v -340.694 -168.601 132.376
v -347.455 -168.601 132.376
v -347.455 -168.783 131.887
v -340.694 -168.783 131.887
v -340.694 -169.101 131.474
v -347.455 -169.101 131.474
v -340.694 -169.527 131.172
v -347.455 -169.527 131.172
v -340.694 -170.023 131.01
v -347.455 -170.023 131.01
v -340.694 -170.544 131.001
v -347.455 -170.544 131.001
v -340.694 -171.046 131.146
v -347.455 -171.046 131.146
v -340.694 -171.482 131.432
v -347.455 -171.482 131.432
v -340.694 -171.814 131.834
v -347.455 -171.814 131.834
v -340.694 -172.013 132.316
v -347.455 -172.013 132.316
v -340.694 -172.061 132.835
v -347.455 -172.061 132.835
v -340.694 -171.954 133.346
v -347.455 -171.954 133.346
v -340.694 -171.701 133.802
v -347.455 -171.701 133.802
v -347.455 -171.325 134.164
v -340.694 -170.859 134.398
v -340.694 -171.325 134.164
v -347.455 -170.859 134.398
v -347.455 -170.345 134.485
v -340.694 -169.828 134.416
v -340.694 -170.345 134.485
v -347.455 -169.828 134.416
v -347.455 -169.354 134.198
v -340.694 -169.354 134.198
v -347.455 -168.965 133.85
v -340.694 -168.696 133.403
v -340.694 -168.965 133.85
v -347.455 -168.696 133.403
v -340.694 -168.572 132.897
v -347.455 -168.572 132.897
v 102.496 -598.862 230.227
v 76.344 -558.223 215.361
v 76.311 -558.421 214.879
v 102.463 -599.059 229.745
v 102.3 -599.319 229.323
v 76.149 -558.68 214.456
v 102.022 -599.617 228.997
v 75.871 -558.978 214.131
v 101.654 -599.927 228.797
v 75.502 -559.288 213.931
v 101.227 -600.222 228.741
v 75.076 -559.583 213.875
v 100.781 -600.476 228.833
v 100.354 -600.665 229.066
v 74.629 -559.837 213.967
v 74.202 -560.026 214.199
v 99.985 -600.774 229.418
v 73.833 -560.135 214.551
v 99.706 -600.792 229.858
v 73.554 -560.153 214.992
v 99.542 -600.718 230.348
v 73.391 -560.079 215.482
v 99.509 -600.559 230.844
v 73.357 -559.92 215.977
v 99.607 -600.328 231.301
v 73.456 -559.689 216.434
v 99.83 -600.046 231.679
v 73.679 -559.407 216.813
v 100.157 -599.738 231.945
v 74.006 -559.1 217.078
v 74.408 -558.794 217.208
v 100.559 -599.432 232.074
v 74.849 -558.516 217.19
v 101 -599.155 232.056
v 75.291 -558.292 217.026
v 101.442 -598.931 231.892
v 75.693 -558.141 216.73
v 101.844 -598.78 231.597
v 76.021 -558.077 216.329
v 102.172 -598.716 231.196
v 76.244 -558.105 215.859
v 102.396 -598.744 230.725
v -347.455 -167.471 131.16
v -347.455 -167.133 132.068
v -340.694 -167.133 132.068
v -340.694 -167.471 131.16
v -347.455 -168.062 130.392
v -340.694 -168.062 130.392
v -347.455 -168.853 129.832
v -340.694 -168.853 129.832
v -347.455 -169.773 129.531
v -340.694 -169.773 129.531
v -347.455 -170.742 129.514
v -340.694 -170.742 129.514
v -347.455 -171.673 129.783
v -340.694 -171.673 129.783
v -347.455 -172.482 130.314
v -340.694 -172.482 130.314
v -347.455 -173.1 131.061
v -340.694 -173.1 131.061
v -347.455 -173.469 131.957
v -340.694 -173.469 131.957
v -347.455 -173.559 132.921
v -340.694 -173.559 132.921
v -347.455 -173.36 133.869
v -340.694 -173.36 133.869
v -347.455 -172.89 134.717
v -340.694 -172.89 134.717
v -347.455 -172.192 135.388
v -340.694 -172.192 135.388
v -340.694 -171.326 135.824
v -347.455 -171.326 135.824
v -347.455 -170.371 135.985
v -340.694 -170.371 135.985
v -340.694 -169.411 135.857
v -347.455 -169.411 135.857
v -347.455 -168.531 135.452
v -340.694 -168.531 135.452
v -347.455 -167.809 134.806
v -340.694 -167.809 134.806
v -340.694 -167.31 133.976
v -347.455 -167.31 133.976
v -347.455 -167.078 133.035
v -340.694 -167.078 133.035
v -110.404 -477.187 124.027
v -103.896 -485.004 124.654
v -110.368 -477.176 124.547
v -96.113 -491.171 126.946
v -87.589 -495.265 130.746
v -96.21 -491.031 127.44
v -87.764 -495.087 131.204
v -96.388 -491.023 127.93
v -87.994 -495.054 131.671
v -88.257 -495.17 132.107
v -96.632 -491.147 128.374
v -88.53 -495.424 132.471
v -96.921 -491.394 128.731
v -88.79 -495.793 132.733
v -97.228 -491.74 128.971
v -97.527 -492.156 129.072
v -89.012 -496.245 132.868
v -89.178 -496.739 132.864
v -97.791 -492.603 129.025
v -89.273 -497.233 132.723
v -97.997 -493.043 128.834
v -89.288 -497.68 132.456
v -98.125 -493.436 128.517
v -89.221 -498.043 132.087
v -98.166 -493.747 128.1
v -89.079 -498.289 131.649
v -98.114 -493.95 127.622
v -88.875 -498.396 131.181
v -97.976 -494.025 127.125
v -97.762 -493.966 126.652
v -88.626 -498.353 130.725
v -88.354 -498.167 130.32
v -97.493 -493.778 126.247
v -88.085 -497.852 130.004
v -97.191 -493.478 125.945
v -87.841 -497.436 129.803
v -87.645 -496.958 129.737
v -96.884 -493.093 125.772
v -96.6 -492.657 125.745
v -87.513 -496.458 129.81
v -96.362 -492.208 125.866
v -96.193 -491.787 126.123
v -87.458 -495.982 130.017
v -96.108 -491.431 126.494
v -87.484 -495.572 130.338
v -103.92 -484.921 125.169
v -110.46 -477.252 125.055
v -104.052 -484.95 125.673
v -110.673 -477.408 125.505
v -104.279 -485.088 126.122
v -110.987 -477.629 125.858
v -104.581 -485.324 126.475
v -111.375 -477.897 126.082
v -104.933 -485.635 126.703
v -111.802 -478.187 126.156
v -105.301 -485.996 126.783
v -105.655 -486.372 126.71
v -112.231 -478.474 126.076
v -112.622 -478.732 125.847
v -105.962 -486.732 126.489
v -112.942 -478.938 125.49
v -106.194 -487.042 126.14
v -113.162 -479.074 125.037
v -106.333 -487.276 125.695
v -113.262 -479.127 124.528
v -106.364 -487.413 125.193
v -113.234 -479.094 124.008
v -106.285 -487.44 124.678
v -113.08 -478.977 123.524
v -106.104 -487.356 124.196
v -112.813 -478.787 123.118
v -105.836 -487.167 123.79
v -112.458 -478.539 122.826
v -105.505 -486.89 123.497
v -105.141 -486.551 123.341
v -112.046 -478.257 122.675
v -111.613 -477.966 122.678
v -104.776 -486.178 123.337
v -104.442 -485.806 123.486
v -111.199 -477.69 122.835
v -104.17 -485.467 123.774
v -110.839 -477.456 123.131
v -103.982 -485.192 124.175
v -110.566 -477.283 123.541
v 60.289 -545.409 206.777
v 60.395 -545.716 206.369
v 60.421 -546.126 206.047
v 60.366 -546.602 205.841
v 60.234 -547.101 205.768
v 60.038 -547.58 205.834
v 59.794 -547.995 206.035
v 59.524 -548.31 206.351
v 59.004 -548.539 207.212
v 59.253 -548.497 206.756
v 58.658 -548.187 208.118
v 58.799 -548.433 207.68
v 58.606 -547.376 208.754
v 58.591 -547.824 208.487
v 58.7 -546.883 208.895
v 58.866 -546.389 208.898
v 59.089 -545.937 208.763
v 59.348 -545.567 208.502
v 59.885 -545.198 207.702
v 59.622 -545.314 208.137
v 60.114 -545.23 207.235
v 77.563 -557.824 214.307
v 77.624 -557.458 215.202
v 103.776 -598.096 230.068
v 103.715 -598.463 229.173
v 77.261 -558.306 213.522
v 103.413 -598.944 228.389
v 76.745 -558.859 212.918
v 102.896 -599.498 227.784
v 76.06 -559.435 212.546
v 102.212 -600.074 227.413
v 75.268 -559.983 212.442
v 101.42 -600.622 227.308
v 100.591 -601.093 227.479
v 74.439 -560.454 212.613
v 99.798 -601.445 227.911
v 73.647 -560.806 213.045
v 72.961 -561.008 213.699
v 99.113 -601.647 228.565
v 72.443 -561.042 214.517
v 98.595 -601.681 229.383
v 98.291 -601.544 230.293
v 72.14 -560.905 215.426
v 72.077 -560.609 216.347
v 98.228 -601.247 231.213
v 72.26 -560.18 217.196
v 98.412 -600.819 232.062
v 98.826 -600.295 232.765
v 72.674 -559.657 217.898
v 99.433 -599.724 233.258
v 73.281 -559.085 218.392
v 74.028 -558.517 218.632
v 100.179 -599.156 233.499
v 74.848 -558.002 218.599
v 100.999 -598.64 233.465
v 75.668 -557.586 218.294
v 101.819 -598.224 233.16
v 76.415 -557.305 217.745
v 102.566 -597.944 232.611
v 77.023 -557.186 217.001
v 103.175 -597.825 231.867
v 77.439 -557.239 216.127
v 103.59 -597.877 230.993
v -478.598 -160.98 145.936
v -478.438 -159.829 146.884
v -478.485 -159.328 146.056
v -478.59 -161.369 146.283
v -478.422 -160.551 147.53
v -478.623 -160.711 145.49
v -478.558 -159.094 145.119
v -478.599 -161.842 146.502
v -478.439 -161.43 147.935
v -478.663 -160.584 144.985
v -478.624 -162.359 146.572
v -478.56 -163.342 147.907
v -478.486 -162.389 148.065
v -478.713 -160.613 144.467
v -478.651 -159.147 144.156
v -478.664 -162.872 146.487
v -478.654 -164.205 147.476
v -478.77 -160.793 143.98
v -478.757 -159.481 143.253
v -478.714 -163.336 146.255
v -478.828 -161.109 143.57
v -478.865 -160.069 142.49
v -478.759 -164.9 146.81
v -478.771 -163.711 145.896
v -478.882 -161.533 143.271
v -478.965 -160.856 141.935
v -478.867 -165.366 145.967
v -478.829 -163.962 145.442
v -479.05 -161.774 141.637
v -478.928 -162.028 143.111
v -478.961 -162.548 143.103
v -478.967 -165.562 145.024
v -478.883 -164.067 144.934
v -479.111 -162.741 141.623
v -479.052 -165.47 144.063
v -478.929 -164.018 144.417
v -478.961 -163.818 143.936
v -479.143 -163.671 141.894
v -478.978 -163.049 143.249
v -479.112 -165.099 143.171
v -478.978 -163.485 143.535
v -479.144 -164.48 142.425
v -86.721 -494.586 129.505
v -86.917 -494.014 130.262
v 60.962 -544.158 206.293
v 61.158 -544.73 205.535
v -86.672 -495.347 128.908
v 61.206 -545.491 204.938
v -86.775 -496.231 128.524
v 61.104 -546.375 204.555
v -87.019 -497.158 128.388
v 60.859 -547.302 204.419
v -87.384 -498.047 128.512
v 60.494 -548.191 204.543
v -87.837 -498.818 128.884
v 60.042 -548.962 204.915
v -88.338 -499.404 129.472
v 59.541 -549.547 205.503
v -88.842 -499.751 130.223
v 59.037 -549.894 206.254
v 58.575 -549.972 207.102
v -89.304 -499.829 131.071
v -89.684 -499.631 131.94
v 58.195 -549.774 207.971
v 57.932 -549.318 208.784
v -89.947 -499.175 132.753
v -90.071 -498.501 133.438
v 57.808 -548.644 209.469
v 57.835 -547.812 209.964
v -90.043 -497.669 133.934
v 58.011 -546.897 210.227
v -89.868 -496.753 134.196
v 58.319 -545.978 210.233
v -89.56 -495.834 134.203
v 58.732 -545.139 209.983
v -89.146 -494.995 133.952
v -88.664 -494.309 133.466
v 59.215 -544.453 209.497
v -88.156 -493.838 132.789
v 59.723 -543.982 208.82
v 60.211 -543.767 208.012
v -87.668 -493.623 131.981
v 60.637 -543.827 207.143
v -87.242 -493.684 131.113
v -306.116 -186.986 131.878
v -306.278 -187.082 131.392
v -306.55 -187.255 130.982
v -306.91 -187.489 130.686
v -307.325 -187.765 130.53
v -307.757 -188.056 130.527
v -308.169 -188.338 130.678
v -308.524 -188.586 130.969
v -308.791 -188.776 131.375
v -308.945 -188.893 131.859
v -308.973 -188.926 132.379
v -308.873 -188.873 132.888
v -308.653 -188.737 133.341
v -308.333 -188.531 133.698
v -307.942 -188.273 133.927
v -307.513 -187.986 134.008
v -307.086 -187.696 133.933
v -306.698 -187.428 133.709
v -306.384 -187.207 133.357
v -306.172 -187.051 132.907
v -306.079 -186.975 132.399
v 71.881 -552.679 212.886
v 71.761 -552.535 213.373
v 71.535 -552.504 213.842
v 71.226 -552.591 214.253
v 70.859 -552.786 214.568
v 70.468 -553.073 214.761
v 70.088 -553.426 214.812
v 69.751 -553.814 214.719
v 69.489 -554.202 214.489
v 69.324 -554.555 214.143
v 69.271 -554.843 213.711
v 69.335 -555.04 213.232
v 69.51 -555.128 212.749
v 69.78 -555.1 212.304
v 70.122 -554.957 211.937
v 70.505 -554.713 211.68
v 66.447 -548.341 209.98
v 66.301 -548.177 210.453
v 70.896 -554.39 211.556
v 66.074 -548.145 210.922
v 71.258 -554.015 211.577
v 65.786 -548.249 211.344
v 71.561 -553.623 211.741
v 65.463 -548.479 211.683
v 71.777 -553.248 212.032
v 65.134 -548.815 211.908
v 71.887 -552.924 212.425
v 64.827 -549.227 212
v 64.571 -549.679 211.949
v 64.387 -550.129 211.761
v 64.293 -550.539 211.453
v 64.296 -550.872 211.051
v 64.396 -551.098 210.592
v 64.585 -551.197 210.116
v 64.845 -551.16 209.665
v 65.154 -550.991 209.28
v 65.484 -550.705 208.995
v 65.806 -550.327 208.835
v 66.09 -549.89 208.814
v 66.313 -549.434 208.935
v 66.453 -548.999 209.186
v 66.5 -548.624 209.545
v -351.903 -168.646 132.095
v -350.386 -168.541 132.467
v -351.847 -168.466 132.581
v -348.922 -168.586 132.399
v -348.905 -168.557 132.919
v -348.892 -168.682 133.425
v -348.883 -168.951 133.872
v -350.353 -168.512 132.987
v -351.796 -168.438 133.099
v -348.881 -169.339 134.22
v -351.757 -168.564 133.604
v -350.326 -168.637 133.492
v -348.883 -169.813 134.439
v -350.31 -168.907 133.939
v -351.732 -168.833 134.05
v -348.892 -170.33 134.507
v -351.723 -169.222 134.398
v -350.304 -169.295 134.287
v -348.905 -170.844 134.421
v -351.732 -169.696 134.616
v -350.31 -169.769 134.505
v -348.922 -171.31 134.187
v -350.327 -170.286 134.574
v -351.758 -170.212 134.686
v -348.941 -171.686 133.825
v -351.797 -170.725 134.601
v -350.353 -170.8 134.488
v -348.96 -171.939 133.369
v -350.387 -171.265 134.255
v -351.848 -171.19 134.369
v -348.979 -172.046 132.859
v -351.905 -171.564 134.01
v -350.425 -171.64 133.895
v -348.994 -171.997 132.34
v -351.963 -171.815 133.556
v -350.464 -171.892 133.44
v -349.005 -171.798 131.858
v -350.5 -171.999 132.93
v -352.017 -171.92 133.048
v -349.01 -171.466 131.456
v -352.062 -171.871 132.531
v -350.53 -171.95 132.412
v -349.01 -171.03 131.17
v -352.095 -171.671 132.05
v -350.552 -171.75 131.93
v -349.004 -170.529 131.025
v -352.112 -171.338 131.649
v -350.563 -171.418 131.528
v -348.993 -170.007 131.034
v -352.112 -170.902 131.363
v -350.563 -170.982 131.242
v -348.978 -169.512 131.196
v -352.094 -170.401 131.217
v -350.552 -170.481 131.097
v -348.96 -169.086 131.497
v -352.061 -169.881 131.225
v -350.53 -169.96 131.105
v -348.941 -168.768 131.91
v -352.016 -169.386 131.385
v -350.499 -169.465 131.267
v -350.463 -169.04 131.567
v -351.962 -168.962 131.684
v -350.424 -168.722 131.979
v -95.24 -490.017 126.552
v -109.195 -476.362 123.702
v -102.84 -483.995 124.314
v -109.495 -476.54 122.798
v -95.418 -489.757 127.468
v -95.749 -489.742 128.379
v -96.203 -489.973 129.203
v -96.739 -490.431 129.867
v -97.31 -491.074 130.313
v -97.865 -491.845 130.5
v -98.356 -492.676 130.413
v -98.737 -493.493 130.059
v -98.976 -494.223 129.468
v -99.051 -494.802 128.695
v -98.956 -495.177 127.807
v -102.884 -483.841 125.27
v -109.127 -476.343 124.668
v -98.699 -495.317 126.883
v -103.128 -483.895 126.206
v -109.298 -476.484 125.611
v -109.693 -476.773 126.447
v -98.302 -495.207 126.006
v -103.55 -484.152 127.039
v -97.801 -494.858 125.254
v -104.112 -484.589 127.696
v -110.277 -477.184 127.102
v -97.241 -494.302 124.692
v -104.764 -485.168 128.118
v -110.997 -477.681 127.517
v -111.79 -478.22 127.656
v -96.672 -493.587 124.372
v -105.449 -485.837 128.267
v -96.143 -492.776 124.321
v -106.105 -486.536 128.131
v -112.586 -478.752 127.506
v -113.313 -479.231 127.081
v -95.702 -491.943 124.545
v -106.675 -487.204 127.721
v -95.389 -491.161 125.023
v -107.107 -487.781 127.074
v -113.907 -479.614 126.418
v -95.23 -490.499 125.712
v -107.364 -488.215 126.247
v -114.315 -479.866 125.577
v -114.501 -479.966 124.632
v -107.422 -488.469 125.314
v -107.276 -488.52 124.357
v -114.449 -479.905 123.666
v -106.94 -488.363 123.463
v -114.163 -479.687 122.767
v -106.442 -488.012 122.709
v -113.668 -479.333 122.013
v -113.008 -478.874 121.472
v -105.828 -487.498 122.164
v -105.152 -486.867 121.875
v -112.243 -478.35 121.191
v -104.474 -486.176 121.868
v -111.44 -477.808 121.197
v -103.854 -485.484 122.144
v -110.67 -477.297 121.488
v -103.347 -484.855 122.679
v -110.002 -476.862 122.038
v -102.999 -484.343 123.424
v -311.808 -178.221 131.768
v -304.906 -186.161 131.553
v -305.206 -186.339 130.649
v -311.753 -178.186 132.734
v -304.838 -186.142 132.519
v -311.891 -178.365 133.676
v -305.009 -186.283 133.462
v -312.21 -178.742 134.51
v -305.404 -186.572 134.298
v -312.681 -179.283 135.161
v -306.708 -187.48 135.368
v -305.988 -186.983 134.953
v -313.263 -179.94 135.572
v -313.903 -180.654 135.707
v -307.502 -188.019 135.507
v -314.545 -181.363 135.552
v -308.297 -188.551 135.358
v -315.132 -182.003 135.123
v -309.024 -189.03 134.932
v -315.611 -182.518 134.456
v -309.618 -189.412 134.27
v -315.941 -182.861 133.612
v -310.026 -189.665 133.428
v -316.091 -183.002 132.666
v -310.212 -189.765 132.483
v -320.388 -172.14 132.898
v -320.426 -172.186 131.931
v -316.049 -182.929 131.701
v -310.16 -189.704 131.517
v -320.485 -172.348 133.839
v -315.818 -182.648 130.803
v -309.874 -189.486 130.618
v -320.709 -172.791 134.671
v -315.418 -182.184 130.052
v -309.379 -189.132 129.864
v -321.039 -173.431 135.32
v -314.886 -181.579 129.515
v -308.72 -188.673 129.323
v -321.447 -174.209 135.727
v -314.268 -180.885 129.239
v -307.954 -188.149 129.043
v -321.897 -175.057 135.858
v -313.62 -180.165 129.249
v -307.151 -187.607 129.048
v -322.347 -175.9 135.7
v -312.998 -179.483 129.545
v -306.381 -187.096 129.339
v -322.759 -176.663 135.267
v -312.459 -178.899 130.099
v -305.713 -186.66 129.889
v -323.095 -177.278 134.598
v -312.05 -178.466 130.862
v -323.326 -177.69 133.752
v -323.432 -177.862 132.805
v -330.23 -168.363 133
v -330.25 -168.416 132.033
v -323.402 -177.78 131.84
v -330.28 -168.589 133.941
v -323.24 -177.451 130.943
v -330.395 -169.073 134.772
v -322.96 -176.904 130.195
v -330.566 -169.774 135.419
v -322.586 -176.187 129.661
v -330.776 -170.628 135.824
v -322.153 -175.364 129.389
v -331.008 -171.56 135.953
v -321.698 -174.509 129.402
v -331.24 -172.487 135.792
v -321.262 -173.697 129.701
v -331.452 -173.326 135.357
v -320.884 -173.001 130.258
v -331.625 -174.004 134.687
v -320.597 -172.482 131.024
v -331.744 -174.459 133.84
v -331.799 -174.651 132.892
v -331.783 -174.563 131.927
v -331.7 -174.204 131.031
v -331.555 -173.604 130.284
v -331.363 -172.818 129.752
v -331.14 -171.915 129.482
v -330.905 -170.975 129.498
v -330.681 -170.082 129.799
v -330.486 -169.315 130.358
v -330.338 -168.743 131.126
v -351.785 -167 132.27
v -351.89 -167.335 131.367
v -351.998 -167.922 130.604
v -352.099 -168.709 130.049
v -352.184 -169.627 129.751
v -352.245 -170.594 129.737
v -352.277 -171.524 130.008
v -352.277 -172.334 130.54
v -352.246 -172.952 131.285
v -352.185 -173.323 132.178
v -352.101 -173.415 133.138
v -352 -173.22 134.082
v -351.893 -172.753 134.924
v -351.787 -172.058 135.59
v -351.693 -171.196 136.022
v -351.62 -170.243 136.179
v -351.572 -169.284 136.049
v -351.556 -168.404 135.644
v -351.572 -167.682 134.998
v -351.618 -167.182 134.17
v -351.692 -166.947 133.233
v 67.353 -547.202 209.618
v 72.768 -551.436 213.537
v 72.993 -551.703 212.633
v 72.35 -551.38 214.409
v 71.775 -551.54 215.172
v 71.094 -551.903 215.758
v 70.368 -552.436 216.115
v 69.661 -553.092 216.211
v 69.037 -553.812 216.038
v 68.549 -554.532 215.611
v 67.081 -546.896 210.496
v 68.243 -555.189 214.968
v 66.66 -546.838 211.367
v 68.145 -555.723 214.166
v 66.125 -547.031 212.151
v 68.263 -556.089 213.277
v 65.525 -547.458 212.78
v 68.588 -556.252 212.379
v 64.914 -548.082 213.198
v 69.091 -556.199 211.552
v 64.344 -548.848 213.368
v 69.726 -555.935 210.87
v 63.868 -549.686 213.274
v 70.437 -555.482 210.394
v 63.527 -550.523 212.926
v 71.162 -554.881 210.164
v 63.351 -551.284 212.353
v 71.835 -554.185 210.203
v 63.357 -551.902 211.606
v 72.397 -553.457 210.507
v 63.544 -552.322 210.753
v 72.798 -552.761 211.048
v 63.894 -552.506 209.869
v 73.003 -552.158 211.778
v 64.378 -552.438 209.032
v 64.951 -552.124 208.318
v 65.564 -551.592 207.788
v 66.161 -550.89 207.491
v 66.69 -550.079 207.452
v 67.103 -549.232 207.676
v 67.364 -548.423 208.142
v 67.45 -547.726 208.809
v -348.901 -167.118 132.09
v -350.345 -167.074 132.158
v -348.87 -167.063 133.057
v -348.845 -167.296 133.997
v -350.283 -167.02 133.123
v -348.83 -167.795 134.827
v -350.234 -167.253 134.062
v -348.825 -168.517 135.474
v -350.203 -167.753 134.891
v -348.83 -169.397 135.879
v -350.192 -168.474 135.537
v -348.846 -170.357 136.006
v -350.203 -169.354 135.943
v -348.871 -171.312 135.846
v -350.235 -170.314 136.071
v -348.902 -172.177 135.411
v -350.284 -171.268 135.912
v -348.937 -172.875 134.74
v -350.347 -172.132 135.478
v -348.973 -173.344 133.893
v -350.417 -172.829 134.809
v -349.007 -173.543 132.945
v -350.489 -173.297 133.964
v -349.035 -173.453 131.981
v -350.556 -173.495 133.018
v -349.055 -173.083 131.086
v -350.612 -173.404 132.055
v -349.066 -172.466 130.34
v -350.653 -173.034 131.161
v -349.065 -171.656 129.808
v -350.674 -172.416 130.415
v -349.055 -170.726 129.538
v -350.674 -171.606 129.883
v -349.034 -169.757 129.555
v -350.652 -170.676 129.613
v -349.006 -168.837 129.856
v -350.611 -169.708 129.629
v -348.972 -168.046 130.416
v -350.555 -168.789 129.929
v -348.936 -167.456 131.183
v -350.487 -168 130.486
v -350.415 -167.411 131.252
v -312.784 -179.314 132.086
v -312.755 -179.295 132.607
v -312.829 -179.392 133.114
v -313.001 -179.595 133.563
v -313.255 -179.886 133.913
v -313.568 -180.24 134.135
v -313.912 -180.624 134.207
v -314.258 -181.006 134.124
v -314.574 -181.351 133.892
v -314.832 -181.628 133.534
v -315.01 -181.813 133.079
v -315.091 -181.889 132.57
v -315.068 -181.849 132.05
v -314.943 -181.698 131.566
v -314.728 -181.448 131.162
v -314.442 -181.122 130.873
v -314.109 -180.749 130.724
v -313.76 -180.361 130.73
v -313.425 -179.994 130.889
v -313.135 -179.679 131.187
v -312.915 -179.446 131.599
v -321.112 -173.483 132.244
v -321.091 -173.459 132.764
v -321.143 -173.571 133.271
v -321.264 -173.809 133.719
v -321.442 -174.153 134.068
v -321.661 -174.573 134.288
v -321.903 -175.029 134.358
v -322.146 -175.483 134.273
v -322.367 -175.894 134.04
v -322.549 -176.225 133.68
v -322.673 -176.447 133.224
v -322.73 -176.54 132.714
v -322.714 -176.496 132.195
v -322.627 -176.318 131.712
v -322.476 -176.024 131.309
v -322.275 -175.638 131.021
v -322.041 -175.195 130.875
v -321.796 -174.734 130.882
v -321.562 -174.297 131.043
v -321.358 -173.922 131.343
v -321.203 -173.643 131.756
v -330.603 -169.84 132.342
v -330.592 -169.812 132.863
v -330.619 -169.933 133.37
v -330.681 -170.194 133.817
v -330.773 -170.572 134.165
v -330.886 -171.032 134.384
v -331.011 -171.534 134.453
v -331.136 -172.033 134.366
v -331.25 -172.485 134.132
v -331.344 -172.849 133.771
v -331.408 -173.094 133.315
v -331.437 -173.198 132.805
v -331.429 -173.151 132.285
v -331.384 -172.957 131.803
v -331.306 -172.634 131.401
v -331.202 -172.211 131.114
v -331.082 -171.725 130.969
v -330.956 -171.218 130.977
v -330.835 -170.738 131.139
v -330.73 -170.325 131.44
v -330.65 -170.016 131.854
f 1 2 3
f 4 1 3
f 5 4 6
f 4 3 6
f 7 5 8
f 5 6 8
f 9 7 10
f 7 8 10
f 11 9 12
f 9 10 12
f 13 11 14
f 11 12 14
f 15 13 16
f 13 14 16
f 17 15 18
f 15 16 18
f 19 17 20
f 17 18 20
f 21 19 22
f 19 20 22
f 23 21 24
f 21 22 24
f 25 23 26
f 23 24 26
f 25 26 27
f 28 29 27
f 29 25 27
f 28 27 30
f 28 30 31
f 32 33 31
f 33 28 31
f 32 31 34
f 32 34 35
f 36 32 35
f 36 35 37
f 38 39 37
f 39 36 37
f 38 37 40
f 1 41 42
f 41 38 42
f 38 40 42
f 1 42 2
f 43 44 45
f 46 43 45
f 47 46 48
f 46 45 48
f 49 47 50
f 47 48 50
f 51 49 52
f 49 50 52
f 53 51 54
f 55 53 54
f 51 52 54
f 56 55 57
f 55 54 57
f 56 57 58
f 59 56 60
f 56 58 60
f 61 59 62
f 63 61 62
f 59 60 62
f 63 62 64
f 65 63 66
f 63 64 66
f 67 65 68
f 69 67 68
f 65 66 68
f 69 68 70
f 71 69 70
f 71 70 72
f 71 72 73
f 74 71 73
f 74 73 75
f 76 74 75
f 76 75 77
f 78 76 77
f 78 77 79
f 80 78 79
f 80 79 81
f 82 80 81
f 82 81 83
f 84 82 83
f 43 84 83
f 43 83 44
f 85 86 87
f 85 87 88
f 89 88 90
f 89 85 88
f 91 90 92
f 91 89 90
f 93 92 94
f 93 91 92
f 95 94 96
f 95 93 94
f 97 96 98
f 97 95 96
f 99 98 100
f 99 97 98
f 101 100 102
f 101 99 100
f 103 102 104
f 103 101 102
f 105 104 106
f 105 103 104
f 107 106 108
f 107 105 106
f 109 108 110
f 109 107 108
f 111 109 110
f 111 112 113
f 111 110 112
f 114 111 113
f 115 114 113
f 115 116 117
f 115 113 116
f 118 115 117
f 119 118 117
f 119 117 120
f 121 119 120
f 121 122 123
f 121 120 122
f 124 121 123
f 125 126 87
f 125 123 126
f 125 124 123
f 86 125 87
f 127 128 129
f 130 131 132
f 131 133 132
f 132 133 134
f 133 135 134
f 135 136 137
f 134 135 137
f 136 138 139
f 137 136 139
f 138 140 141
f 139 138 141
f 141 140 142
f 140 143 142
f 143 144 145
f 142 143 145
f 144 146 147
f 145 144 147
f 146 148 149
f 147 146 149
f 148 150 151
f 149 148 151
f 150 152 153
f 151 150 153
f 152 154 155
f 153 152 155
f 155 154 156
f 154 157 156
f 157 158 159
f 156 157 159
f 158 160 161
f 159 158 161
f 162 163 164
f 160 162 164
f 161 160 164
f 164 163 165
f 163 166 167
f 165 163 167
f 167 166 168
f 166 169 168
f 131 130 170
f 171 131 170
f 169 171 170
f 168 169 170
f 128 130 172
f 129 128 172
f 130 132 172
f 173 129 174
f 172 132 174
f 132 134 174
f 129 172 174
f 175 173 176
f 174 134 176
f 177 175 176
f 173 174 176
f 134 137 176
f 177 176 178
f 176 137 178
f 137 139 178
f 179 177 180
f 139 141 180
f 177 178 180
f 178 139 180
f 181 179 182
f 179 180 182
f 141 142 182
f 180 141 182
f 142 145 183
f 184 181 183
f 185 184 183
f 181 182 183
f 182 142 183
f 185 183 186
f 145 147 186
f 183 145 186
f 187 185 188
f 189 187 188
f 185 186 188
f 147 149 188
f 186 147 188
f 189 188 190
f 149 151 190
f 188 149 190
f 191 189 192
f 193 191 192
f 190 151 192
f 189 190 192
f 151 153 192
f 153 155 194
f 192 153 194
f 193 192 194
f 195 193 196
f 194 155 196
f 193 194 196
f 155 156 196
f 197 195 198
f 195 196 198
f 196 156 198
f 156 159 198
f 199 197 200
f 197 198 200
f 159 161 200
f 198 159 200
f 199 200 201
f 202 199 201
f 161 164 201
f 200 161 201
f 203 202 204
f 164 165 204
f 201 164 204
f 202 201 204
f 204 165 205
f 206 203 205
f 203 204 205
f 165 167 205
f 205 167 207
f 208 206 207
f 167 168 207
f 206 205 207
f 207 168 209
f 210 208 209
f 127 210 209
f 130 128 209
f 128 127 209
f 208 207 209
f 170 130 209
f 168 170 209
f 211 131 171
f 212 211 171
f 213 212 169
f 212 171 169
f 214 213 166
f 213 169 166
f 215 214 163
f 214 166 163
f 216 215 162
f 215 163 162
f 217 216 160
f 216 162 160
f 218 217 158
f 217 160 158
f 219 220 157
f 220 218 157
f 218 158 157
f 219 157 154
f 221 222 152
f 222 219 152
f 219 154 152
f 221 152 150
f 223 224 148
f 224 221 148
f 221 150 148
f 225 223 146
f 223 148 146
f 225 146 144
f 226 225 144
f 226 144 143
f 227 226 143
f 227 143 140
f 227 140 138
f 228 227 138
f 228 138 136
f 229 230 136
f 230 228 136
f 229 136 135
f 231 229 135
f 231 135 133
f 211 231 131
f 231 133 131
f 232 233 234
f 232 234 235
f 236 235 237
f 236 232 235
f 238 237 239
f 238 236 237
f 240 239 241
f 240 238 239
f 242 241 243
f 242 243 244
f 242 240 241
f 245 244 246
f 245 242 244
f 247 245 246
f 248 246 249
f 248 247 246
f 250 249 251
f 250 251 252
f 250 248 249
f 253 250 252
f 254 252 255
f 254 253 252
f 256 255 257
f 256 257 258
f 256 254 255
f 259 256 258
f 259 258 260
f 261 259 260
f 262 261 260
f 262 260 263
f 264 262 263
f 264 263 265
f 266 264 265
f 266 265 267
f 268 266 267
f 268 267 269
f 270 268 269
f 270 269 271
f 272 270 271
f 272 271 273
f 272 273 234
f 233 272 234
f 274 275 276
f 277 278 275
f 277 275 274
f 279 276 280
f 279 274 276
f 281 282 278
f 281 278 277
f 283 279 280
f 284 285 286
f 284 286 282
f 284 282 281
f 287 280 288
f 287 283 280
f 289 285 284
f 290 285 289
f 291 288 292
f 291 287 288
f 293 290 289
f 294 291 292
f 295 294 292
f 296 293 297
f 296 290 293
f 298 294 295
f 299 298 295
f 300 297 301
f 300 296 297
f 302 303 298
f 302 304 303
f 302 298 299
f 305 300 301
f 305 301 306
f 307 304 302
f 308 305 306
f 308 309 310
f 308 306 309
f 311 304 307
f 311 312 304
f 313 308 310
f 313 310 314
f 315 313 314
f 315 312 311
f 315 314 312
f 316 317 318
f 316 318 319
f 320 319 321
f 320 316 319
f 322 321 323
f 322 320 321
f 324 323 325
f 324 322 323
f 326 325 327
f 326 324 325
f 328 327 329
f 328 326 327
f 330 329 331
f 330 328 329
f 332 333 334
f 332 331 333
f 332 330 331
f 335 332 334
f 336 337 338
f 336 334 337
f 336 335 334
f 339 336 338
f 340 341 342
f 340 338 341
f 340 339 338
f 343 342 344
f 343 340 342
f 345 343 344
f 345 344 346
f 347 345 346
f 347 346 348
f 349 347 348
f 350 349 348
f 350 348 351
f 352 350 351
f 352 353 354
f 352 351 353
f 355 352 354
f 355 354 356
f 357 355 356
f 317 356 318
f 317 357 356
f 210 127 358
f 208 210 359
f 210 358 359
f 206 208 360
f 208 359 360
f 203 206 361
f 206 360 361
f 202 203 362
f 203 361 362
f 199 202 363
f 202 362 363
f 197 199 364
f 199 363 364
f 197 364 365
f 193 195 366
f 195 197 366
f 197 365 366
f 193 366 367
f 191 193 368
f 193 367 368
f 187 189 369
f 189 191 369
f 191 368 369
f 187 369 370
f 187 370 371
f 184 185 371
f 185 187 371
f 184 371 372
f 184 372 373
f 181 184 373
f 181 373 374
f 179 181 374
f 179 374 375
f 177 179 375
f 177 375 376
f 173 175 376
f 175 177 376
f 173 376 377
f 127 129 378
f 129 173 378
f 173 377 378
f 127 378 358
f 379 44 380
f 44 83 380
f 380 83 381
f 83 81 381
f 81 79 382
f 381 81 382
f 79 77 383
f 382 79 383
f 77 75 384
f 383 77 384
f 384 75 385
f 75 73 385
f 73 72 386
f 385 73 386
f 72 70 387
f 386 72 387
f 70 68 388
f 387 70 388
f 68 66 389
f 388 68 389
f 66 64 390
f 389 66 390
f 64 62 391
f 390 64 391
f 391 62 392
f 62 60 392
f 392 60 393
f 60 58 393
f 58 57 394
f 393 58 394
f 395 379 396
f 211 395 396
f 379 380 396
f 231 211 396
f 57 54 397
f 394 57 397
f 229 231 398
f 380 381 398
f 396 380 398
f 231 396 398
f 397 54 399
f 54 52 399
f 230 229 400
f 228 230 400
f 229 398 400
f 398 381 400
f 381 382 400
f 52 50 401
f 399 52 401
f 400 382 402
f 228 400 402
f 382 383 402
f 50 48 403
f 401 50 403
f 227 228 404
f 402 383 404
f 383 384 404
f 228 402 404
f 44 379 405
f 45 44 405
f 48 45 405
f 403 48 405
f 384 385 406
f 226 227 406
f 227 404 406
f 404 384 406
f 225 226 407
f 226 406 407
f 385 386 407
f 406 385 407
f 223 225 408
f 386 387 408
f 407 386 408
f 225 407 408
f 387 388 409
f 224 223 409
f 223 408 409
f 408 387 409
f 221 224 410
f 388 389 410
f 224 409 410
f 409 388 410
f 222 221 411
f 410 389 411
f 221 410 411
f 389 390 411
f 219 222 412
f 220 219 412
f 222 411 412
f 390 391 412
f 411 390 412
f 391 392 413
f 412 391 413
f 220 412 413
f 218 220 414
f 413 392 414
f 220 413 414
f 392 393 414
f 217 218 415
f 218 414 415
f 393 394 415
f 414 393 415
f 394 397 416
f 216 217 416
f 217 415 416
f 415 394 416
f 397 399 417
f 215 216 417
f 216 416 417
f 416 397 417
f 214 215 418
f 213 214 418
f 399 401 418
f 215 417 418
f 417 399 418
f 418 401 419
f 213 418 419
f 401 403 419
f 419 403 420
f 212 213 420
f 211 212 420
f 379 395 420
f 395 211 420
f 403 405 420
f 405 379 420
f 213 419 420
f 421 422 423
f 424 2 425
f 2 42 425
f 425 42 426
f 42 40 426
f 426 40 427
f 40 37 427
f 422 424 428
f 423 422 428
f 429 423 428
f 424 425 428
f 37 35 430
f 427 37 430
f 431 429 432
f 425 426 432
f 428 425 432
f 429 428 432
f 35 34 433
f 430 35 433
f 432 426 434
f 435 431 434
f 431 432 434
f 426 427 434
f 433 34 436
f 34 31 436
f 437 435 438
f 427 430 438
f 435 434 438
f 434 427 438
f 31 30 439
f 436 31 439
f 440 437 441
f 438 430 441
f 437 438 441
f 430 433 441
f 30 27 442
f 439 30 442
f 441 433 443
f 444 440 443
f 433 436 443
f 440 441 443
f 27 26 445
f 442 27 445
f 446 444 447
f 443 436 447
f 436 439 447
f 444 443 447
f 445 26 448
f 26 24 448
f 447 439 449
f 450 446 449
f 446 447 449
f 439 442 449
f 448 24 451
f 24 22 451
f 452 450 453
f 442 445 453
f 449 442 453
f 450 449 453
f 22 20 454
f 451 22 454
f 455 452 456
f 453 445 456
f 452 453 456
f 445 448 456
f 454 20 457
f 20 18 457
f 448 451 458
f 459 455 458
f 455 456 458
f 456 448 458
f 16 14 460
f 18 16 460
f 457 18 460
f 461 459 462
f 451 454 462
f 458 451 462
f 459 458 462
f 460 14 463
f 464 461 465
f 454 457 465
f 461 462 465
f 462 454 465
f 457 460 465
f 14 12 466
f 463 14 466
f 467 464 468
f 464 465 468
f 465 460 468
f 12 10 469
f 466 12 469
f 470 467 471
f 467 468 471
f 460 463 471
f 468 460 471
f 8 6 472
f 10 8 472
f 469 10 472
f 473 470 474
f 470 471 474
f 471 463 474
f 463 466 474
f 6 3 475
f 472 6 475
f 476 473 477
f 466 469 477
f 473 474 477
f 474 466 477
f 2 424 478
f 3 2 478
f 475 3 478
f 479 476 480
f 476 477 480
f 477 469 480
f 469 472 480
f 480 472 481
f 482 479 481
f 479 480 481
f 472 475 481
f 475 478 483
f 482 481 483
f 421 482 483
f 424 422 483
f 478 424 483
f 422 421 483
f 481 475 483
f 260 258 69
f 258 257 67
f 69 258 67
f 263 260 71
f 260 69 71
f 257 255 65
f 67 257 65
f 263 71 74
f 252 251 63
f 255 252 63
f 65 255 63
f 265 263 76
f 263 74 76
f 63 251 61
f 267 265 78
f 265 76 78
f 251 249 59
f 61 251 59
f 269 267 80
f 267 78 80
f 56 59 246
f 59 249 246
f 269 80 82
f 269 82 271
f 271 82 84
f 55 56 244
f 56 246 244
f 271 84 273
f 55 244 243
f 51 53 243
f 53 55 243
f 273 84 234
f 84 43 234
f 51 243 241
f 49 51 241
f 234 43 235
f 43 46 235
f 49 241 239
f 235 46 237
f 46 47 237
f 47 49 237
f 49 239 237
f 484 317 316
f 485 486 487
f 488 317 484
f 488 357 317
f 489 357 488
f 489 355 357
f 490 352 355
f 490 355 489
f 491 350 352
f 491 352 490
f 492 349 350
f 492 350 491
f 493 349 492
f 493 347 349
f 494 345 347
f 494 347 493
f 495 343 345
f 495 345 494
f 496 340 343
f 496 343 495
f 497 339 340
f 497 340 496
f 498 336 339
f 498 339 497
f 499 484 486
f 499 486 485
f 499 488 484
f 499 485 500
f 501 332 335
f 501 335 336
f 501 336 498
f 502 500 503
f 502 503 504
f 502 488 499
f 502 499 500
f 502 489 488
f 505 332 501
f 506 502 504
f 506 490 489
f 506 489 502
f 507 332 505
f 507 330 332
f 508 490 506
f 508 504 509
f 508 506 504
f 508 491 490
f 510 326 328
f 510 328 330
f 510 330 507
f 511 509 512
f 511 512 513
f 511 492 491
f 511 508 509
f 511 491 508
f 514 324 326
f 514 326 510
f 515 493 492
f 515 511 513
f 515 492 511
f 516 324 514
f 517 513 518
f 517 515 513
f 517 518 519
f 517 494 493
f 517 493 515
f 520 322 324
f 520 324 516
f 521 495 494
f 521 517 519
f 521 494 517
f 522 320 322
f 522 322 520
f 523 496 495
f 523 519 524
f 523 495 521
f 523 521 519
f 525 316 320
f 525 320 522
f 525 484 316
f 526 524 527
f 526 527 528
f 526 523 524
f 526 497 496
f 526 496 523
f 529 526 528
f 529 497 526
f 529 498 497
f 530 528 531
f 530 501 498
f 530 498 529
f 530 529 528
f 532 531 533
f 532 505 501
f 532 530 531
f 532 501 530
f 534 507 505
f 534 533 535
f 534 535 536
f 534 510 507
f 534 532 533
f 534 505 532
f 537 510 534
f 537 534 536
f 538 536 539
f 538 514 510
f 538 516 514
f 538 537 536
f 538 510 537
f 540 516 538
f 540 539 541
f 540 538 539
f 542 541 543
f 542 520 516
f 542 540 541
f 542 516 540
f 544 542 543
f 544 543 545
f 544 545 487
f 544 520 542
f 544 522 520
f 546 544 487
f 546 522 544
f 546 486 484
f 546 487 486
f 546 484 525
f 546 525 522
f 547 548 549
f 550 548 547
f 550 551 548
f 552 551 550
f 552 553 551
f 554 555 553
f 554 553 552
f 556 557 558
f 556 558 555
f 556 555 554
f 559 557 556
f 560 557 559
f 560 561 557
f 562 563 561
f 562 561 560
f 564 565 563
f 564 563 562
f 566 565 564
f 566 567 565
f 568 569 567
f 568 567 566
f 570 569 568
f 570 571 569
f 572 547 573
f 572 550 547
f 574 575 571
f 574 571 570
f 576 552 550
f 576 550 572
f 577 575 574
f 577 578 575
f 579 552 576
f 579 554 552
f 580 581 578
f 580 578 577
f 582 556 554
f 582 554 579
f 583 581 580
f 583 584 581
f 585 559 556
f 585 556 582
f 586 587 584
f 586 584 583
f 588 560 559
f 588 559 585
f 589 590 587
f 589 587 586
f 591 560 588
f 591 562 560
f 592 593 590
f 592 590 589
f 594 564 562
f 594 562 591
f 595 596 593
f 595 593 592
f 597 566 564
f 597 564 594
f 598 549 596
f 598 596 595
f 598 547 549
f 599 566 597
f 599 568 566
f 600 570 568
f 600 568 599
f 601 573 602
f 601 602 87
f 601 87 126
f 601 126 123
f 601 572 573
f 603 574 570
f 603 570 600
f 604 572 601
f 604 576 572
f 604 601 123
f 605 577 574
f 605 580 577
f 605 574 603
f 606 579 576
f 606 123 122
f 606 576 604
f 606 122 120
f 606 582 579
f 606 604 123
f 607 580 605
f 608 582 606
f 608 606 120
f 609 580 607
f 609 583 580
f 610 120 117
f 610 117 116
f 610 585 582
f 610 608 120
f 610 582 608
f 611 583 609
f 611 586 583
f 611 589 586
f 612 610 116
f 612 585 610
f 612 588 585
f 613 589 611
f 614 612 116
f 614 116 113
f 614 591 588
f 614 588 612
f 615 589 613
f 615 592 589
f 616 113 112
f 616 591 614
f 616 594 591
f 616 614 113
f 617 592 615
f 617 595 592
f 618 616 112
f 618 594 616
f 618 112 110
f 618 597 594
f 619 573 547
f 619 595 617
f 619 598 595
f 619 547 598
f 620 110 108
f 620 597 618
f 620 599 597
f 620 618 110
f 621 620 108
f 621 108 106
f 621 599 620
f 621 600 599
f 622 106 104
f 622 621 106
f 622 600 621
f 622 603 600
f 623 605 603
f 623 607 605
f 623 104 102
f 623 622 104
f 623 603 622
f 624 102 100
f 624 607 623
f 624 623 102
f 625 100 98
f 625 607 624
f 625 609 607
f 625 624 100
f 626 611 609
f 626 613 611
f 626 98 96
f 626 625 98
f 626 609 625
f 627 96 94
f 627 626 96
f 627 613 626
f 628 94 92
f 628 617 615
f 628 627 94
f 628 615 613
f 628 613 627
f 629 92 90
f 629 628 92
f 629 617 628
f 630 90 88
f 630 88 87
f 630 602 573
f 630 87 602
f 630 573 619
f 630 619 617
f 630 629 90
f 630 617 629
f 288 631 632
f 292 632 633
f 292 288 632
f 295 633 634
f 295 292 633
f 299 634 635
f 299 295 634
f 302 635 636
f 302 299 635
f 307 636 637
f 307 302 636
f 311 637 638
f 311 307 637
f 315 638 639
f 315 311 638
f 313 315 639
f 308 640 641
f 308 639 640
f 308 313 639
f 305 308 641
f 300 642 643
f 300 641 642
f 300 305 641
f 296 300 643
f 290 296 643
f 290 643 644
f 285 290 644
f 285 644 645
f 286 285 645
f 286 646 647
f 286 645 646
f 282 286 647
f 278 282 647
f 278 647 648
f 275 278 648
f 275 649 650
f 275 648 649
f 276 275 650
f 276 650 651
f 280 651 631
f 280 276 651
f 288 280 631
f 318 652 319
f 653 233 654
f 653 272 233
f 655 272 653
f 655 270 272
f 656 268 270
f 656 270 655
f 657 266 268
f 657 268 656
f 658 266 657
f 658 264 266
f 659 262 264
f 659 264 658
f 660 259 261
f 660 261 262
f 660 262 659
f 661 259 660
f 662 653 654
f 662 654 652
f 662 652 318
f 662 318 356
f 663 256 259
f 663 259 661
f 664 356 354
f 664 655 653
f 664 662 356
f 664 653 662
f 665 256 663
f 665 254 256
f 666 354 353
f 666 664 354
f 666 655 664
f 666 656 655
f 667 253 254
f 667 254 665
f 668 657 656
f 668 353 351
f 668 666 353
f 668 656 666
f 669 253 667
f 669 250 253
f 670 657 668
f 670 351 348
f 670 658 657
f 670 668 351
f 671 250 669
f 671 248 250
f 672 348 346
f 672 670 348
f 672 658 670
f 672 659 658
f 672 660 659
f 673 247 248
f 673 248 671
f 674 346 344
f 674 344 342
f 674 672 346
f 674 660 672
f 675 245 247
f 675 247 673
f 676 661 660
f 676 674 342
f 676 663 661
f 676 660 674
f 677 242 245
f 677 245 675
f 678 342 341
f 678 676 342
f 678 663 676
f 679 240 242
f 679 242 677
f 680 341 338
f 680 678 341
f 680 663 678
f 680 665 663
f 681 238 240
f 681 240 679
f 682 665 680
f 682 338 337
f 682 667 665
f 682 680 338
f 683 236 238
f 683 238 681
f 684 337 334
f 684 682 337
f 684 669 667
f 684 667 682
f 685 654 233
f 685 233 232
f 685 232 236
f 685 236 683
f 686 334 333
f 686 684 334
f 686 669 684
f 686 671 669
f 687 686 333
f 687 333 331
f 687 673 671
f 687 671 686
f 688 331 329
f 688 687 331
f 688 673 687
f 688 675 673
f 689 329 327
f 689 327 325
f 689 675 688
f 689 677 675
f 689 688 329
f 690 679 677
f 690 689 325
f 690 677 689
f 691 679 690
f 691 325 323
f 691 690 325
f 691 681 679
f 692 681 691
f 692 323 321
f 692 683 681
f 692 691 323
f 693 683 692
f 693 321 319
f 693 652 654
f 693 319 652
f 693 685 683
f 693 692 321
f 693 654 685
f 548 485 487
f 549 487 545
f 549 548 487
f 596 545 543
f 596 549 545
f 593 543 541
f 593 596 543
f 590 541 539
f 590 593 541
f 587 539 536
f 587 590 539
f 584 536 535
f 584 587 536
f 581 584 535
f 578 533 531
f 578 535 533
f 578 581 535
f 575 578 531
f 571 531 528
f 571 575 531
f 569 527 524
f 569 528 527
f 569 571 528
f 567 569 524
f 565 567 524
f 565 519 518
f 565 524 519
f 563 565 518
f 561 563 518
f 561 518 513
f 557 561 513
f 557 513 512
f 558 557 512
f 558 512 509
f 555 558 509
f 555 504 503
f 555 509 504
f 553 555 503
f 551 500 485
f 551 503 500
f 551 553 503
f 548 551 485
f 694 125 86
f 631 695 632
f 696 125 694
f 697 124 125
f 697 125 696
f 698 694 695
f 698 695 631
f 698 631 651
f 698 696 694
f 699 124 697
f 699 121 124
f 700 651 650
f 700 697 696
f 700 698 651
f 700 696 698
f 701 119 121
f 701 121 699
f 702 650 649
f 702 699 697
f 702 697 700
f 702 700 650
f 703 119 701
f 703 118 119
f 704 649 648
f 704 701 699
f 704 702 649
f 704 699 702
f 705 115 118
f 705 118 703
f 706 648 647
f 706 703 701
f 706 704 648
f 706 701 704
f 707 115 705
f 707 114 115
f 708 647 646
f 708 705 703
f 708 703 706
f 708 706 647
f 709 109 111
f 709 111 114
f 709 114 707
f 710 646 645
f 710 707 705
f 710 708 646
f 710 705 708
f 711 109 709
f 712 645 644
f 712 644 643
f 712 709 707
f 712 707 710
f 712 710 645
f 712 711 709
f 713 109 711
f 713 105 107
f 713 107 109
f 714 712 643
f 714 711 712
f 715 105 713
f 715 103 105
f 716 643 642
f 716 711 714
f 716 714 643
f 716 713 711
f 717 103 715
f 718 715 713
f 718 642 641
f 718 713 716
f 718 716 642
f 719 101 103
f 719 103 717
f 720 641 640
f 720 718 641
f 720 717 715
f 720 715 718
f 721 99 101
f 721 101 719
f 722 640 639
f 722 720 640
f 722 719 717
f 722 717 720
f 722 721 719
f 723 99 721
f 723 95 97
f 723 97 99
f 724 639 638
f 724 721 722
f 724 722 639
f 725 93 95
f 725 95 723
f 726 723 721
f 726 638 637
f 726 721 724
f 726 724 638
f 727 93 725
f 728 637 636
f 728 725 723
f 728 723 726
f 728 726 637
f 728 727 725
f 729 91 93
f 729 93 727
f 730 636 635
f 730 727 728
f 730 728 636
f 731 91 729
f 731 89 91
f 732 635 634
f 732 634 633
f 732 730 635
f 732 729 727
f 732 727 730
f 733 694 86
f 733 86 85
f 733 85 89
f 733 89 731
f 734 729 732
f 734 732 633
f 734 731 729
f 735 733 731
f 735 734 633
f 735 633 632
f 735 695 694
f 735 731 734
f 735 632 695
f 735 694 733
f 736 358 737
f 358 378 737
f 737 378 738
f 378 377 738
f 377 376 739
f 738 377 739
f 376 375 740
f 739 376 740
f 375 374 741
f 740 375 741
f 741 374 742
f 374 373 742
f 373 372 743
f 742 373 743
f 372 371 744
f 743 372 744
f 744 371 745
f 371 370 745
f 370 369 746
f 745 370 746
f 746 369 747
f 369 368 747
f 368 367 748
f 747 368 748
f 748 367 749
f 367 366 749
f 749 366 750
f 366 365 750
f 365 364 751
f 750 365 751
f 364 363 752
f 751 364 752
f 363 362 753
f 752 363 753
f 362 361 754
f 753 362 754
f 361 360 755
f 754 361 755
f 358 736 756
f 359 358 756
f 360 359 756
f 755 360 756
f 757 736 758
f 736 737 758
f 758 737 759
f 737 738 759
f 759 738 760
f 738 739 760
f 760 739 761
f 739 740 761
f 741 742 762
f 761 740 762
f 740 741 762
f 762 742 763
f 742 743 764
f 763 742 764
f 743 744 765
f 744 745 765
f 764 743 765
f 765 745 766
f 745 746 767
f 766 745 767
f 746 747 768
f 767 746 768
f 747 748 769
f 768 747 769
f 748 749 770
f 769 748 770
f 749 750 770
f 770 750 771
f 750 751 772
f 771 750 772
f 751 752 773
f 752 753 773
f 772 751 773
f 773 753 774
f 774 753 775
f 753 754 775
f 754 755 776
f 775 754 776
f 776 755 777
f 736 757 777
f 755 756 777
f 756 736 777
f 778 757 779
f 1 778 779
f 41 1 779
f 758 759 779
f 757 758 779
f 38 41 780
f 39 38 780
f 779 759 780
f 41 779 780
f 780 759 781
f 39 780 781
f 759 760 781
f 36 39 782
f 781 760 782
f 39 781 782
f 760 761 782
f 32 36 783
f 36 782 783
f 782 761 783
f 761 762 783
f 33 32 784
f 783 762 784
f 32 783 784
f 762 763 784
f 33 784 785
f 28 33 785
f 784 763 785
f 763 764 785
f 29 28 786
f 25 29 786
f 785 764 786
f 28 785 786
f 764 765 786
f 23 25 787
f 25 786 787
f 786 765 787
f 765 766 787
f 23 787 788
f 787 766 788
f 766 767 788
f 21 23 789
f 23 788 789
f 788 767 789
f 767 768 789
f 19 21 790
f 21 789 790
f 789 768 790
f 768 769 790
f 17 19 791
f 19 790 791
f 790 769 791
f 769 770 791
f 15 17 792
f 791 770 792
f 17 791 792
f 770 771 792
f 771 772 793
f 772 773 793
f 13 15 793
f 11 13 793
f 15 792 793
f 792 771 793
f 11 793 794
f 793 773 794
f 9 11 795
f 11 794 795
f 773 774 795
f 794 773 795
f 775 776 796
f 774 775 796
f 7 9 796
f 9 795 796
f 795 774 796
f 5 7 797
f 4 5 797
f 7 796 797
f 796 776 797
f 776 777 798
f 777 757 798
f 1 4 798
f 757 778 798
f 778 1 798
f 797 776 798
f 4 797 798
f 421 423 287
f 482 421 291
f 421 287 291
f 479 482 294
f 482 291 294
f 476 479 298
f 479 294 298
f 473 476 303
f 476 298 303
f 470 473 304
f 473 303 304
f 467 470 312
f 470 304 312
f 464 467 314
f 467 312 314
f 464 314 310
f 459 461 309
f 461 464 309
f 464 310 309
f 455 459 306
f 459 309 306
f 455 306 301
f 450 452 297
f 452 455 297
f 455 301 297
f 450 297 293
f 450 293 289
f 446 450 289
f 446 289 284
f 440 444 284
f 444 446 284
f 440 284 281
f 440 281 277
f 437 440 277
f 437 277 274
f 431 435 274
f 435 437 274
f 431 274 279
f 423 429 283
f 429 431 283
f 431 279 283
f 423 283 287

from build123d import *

# Parameters (mm, degrees)
SZKIC1_R   = 3.25
SZKIC1_R_2 = 1.75


with BuildPart() as part:
    # Wyciągnięcie po ścieżce4: sweep along a curve in space
    with BuildLine() as wyci_gni_cie_po_cie_ce4_path:
        Line((101.002175739, -599.755205595, 230.41246958), (74.850696308, -559.116516703, 215.546064653))
        ThreePointArc((59.504530347, -546.867351488, 207.340867047), (68.089990081, -551.58603587, 211.835850617), (74.850696308, -559.116516703, 215.546064653))
        Line((-88.374063747, -496.723607563, 131.310132464), (59.504530347, -546.867351488, 207.340867047))
        ThreePointArc((-111.816027792, -478.149064418, 124.40695353), (-101.261916385, -489.591337463, 126.022515141), (-88.374063747, -496.723607563, 131.310132464))
        Line((-307.527245601, -187.948009553, 132.258208808), (-111.816027792, -478.149064418, 124.40695353))
        ThreePointArc((-307.527245601, -187.948009553, 132.258208808), (-321.911039025, -174.996735159, 132.608599545), (-340.694228743, -170.314051144, 132.735287394))
        Line((-340.694228743, -170.314051144, 132.735287394), (-347.455121341, -170.314051144, 132.735287394))
        ThreePointArc((-347.455121341, -170.314051144, 132.735287394), (-349.69039399, -170.279594721, 132.787436726), (-351.918680923, -170.176333137, 132.943721743))
        Line((-351.918680923, -170.176333137, 132.943721743), (-478.784997122, -162.32310334, 144.829479287))
    # Szkic1 → Wyciągnięcie po ścieżce4 (sweep)
    with BuildSketch(Plane(origin=(101.002175739, -599.755205595, 230.41246958), x_dir=(0.8533828719682364, 0.5104047203493964, -0.10594666241226798), z_dir=(-0.5172264929682565, 0.8037559247680768, -0.29402919646180037))):
        Circle(SZKIC1_R)
        Circle(SZKIC1_R_2, mode=Mode.SUBTRACT)
    sweep(path=wyci_gni_cie_po_cie_ce4_path.line)


solid = part.part
